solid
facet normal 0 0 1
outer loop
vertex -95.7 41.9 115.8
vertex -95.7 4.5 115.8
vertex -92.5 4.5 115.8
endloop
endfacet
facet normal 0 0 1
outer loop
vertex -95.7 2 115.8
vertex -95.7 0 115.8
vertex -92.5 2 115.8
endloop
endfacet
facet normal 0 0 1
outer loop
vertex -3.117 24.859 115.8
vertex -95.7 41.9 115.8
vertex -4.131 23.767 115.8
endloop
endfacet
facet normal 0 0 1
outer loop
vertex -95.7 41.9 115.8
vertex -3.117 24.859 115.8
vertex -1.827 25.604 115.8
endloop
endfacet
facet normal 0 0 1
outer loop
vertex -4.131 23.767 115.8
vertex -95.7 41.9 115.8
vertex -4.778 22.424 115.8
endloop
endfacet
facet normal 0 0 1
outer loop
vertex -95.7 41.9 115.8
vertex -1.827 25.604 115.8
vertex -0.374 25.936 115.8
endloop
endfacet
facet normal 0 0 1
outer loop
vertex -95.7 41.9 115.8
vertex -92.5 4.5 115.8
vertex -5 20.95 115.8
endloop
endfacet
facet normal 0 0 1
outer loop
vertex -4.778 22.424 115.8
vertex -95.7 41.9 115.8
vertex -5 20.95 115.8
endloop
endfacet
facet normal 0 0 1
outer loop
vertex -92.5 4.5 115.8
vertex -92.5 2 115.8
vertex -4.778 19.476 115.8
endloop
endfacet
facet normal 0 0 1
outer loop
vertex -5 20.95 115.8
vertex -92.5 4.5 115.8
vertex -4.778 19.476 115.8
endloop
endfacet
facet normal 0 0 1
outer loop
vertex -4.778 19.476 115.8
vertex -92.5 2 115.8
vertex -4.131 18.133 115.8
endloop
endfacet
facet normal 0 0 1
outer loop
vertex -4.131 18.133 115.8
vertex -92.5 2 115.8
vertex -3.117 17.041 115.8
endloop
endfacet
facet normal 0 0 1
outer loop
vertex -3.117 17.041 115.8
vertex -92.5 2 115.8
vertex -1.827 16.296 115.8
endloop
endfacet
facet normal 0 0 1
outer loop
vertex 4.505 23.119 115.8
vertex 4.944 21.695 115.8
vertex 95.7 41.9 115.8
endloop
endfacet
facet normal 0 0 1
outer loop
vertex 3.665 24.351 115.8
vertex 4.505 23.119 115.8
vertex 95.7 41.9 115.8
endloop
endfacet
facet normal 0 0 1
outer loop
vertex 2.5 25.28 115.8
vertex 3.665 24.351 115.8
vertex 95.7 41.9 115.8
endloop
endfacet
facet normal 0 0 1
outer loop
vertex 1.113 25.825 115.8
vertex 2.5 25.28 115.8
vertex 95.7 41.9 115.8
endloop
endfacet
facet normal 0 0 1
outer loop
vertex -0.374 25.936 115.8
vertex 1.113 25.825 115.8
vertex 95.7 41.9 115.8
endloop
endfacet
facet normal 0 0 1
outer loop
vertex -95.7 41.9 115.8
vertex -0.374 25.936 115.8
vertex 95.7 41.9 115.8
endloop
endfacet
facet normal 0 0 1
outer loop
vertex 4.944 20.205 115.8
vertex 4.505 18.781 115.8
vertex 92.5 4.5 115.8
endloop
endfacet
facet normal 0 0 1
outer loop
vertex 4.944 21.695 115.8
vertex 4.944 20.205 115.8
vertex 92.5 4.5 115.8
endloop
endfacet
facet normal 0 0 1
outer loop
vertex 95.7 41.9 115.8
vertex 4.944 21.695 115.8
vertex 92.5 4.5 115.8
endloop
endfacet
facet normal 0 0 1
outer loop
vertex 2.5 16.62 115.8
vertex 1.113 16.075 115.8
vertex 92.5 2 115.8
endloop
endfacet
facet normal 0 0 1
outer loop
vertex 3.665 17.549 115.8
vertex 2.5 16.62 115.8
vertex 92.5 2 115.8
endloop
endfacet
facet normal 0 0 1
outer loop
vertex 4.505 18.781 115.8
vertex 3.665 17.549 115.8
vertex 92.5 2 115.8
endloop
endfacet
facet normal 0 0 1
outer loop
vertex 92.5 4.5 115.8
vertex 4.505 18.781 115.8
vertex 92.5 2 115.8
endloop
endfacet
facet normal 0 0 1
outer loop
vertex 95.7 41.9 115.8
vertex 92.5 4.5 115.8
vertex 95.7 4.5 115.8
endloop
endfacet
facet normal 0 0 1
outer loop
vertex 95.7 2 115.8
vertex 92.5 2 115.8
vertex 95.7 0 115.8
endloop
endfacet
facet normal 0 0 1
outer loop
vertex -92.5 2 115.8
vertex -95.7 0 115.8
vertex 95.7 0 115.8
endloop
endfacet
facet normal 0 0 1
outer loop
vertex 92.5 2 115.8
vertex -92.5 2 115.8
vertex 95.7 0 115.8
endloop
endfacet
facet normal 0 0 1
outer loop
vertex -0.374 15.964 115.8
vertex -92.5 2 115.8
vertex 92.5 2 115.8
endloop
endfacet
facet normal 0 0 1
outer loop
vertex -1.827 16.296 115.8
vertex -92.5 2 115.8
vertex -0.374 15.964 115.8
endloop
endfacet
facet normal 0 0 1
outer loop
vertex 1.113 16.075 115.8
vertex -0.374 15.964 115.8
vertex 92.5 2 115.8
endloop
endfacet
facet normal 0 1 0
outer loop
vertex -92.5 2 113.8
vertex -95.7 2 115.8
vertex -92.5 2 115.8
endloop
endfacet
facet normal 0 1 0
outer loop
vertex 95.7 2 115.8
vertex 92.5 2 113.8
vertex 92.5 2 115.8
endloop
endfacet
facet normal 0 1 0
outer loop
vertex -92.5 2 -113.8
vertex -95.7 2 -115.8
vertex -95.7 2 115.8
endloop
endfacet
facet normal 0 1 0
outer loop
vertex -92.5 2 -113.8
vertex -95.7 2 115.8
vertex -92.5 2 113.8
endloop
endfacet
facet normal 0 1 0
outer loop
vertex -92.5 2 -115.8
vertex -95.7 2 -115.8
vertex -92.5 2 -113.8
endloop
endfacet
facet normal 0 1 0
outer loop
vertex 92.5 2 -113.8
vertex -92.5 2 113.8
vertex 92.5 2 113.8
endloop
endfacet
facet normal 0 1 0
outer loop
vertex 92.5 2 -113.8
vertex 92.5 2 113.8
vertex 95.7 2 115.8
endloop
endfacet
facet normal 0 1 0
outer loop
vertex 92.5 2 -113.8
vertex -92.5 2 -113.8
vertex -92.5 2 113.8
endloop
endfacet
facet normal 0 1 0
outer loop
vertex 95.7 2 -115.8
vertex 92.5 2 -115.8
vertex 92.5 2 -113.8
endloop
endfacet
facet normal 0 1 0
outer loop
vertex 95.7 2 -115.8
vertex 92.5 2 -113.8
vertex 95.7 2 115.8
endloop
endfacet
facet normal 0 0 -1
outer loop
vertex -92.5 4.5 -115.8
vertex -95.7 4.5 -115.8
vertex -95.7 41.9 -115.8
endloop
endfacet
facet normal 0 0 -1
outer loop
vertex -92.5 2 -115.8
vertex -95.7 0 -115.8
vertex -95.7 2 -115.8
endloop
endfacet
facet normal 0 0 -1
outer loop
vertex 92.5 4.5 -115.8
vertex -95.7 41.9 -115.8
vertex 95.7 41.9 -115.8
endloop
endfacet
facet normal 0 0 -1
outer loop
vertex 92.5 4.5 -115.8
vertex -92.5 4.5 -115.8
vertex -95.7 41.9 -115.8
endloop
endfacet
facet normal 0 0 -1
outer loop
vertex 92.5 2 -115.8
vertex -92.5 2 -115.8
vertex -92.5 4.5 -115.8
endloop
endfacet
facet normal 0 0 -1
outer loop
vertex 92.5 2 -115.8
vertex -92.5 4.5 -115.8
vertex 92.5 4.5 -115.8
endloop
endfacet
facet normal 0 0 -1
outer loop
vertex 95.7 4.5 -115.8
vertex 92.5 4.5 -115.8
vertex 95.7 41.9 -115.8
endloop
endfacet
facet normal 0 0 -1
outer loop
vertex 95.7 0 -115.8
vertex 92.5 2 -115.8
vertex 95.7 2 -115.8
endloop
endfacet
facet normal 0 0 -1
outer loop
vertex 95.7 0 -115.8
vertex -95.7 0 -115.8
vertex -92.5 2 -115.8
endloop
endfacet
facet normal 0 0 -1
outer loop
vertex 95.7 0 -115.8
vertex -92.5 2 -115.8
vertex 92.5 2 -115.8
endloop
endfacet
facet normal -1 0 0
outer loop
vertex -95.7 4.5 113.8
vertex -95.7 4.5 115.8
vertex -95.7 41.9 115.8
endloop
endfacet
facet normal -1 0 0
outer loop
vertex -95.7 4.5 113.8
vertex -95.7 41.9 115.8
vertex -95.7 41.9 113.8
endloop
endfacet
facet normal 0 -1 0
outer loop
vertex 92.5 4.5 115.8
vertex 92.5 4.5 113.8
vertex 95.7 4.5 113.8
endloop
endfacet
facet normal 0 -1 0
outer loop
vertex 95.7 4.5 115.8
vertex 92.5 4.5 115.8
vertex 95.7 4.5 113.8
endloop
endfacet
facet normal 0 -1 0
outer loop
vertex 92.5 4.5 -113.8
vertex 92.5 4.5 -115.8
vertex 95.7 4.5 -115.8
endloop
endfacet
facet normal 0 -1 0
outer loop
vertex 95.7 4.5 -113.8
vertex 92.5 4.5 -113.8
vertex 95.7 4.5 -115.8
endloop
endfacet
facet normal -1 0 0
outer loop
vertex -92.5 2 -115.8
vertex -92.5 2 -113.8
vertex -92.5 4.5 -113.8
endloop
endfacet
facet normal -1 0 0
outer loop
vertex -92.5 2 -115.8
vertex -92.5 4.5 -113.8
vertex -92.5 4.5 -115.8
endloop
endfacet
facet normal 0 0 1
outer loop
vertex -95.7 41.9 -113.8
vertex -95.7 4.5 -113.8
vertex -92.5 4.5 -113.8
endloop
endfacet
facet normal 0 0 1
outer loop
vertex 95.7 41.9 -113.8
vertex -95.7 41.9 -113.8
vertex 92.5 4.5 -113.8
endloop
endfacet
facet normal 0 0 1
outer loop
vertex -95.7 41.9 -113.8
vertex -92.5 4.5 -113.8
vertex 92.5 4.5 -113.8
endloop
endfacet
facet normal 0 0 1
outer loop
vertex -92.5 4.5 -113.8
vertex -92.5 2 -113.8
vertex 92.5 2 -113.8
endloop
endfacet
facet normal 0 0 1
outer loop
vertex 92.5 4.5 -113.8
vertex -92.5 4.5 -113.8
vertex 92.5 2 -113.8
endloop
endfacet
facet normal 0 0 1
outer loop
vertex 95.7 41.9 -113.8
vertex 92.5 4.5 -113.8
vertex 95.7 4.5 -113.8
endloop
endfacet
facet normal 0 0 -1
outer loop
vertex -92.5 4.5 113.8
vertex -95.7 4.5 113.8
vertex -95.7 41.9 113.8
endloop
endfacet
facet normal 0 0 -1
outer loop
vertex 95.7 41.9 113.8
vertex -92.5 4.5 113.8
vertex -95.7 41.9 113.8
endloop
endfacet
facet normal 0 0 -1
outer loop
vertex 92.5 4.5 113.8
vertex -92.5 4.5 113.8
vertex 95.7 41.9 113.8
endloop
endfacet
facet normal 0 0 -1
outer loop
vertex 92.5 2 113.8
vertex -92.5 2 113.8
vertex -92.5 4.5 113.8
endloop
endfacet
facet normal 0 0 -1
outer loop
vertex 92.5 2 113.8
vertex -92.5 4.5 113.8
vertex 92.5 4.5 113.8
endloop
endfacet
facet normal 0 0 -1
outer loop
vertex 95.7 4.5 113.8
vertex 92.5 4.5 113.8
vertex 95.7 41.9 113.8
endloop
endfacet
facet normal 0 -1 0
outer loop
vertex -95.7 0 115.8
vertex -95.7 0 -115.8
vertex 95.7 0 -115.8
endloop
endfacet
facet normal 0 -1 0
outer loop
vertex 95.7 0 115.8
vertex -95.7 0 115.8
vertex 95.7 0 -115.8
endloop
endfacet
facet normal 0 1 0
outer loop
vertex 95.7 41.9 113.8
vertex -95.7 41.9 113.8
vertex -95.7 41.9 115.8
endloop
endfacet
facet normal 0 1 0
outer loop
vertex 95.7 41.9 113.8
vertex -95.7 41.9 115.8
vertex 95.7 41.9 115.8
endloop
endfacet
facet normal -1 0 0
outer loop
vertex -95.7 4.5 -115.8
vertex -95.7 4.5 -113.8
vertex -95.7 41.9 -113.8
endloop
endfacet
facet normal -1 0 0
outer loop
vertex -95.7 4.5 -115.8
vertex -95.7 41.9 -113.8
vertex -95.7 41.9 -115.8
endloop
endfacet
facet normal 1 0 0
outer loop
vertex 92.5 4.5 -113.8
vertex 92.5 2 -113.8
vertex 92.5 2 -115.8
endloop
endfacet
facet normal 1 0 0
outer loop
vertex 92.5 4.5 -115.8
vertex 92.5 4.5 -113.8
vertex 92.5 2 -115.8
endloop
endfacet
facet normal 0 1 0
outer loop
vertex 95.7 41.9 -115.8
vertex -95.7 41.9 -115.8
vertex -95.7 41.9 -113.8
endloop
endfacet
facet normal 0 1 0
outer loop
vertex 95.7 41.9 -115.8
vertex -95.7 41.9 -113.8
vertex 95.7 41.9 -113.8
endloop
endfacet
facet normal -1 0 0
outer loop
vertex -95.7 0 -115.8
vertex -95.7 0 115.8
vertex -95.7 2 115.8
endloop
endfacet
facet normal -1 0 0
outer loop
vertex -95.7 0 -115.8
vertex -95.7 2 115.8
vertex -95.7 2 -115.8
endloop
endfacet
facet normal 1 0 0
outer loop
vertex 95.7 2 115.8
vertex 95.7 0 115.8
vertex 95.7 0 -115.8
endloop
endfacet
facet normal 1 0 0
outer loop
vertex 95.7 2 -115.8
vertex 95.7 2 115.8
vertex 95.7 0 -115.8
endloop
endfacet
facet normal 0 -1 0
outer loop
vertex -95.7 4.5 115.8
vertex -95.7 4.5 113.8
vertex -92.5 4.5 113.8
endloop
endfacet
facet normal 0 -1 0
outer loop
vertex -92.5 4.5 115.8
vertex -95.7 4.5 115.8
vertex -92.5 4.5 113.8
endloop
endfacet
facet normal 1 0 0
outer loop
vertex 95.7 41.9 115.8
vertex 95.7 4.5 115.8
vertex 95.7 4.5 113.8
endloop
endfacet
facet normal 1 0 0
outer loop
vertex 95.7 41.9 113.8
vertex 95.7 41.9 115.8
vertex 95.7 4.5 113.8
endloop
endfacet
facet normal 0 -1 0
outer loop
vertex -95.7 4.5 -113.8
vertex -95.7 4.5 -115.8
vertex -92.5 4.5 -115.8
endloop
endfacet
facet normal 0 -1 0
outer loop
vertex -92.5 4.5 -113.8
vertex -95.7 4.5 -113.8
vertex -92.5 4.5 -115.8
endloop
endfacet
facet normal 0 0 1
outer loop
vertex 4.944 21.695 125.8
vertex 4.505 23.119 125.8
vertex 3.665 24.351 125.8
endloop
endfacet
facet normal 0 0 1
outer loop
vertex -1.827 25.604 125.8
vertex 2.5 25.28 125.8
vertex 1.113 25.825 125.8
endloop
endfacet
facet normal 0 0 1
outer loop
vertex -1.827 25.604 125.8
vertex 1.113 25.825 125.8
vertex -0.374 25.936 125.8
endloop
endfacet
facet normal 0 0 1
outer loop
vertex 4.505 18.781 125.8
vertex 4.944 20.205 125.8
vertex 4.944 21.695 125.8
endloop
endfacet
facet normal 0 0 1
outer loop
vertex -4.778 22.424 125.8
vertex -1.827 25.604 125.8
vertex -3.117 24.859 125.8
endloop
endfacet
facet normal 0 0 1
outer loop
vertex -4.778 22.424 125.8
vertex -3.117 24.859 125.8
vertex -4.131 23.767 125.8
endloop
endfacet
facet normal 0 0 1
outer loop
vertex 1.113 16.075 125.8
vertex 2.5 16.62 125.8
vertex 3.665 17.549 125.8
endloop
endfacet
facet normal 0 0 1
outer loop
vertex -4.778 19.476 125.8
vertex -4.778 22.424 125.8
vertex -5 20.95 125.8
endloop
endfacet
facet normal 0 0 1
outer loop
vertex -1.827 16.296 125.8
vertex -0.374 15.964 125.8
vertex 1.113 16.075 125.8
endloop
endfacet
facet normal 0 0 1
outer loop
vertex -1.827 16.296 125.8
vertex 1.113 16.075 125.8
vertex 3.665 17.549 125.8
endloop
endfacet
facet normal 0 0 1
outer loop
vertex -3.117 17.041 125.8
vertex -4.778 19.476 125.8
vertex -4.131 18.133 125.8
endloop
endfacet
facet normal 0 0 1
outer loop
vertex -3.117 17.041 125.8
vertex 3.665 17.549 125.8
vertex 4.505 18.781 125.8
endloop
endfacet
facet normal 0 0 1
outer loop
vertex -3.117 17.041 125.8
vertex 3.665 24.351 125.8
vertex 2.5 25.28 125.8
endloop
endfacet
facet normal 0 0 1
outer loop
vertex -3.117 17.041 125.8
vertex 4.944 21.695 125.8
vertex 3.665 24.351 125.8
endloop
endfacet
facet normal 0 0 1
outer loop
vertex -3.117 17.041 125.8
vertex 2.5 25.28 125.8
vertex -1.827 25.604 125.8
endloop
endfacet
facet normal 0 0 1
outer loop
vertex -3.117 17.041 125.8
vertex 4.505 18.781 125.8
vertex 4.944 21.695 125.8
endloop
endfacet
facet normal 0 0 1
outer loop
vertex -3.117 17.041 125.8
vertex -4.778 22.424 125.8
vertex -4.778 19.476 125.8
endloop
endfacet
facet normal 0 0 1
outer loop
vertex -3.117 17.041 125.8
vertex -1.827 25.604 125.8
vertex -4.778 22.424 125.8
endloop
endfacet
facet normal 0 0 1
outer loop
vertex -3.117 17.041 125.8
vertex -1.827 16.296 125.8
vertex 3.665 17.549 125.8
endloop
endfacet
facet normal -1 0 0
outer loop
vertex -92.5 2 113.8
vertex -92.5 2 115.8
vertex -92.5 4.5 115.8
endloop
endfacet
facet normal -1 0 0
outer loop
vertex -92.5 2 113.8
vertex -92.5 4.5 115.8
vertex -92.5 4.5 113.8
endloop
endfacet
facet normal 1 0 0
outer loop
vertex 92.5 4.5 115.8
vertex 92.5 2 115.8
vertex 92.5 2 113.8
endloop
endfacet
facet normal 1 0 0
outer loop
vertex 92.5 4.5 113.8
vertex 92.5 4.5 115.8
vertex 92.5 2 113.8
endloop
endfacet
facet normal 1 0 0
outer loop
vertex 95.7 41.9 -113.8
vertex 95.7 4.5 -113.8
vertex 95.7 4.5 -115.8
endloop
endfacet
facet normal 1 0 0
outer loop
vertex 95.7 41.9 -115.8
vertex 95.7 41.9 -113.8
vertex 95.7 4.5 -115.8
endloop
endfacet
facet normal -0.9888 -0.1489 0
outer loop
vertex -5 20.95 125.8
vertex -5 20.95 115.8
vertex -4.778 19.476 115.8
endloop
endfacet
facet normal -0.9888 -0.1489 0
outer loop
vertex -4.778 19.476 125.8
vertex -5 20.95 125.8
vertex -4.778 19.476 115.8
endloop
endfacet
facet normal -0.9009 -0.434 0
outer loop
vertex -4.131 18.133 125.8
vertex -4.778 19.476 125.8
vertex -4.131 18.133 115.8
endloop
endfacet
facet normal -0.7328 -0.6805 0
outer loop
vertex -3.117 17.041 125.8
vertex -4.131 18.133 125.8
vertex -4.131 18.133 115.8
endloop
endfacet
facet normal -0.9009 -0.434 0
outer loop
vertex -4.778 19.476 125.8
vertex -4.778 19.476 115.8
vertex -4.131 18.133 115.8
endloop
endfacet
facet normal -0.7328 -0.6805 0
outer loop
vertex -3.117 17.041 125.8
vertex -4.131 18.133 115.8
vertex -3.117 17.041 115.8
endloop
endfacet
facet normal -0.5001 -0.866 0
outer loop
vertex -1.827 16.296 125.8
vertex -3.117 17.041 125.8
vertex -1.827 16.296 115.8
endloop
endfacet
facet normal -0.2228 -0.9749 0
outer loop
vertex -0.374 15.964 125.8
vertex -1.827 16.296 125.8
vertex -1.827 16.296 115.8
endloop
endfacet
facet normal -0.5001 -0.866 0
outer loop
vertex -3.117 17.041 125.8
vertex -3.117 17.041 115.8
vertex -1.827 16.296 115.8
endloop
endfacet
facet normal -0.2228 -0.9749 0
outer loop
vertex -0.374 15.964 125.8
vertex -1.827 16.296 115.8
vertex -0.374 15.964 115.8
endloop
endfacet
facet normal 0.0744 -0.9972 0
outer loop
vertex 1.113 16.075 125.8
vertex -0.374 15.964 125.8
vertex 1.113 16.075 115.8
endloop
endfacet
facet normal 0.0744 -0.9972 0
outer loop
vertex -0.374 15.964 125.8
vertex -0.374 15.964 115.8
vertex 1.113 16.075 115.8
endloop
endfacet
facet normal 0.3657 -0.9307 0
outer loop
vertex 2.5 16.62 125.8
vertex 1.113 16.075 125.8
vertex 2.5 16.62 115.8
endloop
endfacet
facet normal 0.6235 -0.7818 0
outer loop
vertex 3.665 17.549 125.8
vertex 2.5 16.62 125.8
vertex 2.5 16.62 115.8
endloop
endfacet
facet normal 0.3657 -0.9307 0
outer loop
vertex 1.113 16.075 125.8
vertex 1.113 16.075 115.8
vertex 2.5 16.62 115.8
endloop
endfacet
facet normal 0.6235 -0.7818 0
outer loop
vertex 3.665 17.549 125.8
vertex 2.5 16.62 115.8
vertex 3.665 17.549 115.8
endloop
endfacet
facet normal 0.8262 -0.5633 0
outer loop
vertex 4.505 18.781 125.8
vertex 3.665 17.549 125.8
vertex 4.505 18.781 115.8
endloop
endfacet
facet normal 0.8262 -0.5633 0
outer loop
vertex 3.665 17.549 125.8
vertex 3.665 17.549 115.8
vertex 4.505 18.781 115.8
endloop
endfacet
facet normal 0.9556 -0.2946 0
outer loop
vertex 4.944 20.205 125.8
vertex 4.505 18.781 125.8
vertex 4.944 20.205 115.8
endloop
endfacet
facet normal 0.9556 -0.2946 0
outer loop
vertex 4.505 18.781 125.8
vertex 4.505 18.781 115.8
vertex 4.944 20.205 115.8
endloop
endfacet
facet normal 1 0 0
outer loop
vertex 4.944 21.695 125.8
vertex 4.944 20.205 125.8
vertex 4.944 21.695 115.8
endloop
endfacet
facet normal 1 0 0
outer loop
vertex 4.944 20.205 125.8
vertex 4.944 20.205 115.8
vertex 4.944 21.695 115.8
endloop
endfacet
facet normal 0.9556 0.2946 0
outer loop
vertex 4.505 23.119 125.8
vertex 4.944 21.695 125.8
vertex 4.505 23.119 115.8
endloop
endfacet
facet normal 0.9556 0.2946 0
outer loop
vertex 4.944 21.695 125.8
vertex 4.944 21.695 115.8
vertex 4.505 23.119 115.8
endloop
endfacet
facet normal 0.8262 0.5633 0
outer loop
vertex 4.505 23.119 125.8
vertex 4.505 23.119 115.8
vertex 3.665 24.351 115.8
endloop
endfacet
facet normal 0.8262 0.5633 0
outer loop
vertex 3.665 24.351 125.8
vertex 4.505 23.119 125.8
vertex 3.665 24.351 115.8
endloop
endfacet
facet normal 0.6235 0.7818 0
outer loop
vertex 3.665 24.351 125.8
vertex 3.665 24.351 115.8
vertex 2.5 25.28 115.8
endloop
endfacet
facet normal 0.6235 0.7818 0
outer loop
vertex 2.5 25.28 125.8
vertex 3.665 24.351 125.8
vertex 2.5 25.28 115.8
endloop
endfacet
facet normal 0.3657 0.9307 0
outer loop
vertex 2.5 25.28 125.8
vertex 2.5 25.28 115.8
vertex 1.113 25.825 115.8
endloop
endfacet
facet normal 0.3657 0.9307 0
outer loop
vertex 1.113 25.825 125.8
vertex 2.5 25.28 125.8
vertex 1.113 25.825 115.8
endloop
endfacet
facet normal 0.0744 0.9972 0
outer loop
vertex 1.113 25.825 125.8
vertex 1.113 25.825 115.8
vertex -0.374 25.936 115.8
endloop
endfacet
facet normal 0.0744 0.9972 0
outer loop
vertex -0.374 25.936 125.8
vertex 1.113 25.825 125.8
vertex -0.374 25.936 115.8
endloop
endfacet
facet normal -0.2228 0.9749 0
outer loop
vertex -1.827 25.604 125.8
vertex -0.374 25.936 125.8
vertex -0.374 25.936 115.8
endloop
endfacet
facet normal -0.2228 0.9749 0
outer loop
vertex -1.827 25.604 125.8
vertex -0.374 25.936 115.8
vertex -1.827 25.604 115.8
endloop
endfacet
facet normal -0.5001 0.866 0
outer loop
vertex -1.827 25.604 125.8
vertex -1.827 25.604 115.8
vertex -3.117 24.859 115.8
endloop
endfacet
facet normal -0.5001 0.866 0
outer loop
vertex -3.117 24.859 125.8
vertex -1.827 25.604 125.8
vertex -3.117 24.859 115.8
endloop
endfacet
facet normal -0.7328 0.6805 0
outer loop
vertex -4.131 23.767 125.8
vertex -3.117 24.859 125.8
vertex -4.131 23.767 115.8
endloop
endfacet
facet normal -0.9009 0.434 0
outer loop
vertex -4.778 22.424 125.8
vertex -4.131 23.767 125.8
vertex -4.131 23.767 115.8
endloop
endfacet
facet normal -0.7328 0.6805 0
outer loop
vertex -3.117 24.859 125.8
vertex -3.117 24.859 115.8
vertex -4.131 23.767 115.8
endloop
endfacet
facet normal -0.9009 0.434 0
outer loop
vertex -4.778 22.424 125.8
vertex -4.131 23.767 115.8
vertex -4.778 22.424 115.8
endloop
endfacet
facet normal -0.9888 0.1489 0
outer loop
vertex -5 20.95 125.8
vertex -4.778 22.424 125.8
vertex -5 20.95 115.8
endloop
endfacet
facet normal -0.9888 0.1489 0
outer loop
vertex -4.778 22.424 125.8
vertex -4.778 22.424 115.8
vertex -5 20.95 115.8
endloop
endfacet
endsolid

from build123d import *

# Parameters (mm, degrees)
SKETCH_2_W      = 191.4
SKETCH_2_H      = 231.6
EXTRUDE_1_DEPTH = 2
SKETCH_3_W      = 185
SKETCH_3_H      = 2
EXTRUDE_2_DEPTH = 2.5
SKETCH_4_W      = 191.4
SKETCH_4_H      = 2
EXTRUDE_3_DEPTH = 37.4
SKETCH_7_R      = 5
EXTRUDE_5_DEPTH = 10


with BuildPart() as part:
    # 草图2 → 凸台-拉伸1 (new body)
    with BuildSketch(Plane(origin=(0, 0, 0), x_dir=(1, 0, 0), z_dir=(0, 1, 0))):
        Rectangle(SKETCH_2_W, SKETCH_2_H)
    extrude(amount=EXTRUDE_1_DEPTH)

    # 草图3 → 凸台-拉伸2 (add)
    with BuildSketch(Plane(origin=(0, 2, 0), x_dir=(1, 0, 0), z_dir=(0, 1, 0))):
        with Locations((0, 114.8)):
            Rectangle(SKETCH_3_W, SKETCH_3_H)
        with Locations((0, -114.8)):
            Rectangle(SKETCH_3_W, SKETCH_3_H)
    extrude(amount=EXTRUDE_2_DEPTH)

    # 草图4 → 凸台-拉伸3 (add)
    with BuildSketch(Plane(origin=(0, 4.5, 0), x_dir=(1, 0, 0), z_dir=(0, 1, 0))):
        with Locations((0, 114.8)):
            Rectangle(SKETCH_4_W, SKETCH_4_H)
        with Locations((0, -114.8)):
            Rectangle(SKETCH_4_W, SKETCH_4_H)
    extrude(amount=EXTRUDE_3_DEPTH)

    # 草图7 → 凸台-拉伸5 (add)
    with BuildSketch(Plane.XY.offset(115.8)):
        with Locations(Location((0, 20.95, 0), (0, 0, 180))):
            Circle(SKETCH_7_R)
    extrude(amount=EXTRUDE_5_DEPTH)


solid = part.part
